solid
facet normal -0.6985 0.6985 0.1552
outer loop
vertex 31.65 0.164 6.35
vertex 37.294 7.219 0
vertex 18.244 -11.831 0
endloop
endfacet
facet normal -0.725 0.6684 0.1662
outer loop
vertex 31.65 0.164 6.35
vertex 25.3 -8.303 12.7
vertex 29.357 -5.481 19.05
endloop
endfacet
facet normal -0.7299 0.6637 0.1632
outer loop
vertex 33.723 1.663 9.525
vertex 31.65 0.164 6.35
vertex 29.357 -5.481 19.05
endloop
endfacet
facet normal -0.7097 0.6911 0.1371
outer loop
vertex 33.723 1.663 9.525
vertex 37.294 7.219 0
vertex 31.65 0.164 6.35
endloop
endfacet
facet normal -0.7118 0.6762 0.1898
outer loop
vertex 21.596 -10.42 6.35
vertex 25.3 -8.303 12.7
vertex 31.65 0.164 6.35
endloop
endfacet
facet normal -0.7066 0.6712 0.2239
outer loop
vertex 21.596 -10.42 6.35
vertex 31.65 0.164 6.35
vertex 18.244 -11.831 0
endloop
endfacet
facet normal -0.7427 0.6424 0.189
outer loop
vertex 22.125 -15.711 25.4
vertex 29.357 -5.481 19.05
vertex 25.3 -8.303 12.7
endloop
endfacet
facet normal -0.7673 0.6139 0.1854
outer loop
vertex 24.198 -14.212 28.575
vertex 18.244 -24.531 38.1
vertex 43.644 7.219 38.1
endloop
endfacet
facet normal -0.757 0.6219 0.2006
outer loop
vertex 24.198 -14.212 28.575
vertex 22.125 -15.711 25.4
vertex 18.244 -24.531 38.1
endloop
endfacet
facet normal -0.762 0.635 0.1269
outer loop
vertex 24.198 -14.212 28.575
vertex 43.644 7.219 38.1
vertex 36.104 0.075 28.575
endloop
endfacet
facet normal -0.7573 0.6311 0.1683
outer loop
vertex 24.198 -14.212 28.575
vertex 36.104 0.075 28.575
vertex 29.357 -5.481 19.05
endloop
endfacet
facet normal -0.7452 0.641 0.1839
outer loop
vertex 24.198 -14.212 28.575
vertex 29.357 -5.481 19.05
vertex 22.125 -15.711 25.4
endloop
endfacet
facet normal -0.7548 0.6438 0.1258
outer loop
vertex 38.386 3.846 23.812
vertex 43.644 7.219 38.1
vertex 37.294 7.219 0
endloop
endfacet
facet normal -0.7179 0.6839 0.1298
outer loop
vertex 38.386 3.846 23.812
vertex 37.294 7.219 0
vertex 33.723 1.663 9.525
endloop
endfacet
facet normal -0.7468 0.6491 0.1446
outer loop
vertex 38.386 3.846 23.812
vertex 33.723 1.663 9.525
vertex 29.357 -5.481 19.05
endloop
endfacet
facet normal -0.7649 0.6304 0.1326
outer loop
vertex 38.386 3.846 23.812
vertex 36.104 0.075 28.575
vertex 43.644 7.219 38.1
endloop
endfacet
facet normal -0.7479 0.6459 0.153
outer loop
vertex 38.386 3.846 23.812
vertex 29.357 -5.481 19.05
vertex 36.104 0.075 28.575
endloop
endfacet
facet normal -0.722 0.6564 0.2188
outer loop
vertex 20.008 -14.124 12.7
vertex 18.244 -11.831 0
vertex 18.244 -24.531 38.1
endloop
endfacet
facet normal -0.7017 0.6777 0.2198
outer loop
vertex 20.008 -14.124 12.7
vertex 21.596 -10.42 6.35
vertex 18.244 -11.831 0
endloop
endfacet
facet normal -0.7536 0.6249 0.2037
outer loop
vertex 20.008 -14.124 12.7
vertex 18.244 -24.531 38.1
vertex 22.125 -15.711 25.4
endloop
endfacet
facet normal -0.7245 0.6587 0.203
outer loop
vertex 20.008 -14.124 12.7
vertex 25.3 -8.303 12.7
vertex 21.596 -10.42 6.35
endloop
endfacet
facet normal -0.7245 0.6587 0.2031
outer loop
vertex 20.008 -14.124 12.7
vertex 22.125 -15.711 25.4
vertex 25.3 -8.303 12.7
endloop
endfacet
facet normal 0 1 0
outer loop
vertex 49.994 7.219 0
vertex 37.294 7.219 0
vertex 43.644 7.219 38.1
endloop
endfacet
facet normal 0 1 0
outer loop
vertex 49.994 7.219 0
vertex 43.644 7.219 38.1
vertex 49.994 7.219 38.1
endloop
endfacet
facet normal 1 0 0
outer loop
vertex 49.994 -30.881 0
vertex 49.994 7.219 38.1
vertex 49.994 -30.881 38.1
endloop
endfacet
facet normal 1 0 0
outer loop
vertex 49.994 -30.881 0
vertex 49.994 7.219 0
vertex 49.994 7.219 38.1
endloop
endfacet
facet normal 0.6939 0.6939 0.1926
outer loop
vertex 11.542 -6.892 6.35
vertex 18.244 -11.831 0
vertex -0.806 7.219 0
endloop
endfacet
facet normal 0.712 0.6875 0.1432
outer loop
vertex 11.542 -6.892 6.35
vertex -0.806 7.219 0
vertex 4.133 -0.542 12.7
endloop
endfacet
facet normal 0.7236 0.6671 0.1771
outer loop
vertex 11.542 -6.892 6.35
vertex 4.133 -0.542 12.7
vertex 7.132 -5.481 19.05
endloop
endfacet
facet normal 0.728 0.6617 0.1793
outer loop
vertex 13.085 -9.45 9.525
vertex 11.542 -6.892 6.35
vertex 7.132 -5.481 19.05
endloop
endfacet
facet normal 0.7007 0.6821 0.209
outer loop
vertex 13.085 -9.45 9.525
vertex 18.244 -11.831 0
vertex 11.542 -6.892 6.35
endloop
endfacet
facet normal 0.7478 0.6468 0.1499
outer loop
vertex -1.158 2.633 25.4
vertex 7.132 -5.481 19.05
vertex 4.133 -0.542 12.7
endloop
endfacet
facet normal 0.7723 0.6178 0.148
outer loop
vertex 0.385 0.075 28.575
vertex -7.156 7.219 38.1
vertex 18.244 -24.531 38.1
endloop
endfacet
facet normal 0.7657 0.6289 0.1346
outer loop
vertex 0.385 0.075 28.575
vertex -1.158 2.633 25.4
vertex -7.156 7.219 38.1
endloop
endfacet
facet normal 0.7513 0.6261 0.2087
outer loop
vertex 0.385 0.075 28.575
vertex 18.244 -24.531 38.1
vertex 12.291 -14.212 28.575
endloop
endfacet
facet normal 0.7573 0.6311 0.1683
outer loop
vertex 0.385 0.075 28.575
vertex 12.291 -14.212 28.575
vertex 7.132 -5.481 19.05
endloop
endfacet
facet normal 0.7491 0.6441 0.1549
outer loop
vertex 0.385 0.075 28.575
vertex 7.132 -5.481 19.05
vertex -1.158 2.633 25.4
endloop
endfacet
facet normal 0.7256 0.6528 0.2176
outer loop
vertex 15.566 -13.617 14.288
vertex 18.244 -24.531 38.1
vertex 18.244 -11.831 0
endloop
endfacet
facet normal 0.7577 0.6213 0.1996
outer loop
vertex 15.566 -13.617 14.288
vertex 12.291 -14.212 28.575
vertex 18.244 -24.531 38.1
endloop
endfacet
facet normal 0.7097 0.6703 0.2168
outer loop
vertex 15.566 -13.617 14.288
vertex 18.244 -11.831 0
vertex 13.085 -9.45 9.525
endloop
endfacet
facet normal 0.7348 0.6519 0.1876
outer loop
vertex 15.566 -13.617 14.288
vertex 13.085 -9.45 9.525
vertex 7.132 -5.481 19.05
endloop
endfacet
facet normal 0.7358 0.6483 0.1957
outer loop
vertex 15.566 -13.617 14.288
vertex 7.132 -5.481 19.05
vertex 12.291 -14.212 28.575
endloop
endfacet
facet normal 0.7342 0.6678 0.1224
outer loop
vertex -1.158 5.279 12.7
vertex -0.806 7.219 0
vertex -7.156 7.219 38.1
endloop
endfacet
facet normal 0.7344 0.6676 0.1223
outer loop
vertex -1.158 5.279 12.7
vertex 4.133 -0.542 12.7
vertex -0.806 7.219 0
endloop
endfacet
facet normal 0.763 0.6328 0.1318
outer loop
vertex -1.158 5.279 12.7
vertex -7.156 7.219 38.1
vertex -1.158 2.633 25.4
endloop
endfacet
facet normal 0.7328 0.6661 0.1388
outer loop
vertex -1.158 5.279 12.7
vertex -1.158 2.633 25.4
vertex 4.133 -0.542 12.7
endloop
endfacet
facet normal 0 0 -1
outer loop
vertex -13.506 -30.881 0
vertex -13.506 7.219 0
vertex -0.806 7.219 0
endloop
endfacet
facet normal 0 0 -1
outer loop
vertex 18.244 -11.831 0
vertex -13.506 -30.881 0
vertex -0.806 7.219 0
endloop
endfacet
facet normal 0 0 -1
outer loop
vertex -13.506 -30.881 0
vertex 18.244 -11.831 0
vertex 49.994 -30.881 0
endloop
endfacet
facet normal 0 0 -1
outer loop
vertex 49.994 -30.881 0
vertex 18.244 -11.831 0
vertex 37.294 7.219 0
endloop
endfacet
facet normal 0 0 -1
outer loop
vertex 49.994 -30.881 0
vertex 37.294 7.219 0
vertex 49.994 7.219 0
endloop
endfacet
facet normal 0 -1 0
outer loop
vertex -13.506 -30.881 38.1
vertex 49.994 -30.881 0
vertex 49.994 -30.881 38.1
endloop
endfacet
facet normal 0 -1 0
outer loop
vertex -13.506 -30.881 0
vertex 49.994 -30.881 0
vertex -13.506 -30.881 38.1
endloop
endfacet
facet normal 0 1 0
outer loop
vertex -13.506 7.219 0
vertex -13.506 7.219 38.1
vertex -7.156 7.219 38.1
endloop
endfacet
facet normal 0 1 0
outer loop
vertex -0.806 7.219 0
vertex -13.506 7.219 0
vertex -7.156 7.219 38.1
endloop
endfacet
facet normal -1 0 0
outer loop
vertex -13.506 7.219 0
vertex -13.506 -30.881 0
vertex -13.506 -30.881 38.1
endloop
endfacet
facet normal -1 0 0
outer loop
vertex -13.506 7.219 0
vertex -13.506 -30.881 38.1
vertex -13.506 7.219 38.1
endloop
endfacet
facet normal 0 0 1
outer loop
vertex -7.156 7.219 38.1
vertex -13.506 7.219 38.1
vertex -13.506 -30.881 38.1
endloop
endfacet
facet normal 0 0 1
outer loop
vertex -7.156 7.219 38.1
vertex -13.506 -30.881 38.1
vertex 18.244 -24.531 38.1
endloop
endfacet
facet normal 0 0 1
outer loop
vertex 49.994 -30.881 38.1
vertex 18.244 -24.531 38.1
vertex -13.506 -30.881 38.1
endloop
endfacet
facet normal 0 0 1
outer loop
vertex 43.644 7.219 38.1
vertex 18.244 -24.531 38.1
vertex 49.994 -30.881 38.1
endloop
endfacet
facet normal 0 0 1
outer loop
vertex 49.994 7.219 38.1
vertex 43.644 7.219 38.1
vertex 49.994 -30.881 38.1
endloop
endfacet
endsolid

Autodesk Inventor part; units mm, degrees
ref_plane "YZ Plane" through (0, 0, 0) normal (1, 0, 0) x (0, 1, 0)
ref_plane "XZ Plane" through (0, 0, 0) normal (0, 1, 0) x (-1, 0, 0)
ref_plane "XY Plane" through (0, 0, 0) normal (0, 0, 1) x (1, 0, 0)
sketch "Sketch1" plane through (0, 0, 0) normal (0, 0, 1) x (1, 0, 0)
  line L0 (-13.5055, 7.2192) -> (49.9945, 7.2192)
  line L1 (49.9945, 7.2192) -> (49.9945, -30.8808)
  line L2 (49.9945, -30.8808) -> (-13.5055, -30.8808)
  line L3 (-13.5055, -30.8808) -> (-13.5055, 7.2192)
  point P0 (0, 0)
  dimension "d0" = 63.5
  dimension "d1" = 38.1
extrude "Extrusion1" add sketch "Sketch1" along normal blind 38.1
sketch "Sketch2" plane through (0, 0, 38.1) normal (0, 0, 1) x (1, 0, 0)
  line L0 (18.2445, -24.5308) -> (43.6445, 7.2192)
  line L1 (49.9945, 7.2192) -> (-13.5055, 7.2192) projected
  line L2 (18.2445, -24.5308) -> (-7.1555, 7.2192)
  line L3 (-13.5055, -30.8808) -> (49.9945, -30.8808) projected
  point P0 (0, 0)
  dimension "d4" = 6.35
  dimension "d5" = 6.35
  dimension "d6" = 6.35
sketch "Sketch4" plane through (0, 0, 0) normal (0, 0, -1) x (-1, 0, 0)
  line L0 (-18.2445, -11.8308) -> (-37.2945, 7.2192)
  line L1 (-49.9945, 7.2192) -> (13.5055, 7.2192) projected
  line L2 (-18.2445, -11.8308) -> (0.8055, 7.2192)
  line L3 (-49.9945, -30.8808) -> (13.5055, -30.8808) projected
  point P0 (0, 0)
  dimension "d8" = 19.05
  dimension "d9" = 12.7
  dimension "d10" = 12.7
loft "Loft1" cut profiles "Sketch4", "Sketch2"
properties part number "AW5.5bloft"
